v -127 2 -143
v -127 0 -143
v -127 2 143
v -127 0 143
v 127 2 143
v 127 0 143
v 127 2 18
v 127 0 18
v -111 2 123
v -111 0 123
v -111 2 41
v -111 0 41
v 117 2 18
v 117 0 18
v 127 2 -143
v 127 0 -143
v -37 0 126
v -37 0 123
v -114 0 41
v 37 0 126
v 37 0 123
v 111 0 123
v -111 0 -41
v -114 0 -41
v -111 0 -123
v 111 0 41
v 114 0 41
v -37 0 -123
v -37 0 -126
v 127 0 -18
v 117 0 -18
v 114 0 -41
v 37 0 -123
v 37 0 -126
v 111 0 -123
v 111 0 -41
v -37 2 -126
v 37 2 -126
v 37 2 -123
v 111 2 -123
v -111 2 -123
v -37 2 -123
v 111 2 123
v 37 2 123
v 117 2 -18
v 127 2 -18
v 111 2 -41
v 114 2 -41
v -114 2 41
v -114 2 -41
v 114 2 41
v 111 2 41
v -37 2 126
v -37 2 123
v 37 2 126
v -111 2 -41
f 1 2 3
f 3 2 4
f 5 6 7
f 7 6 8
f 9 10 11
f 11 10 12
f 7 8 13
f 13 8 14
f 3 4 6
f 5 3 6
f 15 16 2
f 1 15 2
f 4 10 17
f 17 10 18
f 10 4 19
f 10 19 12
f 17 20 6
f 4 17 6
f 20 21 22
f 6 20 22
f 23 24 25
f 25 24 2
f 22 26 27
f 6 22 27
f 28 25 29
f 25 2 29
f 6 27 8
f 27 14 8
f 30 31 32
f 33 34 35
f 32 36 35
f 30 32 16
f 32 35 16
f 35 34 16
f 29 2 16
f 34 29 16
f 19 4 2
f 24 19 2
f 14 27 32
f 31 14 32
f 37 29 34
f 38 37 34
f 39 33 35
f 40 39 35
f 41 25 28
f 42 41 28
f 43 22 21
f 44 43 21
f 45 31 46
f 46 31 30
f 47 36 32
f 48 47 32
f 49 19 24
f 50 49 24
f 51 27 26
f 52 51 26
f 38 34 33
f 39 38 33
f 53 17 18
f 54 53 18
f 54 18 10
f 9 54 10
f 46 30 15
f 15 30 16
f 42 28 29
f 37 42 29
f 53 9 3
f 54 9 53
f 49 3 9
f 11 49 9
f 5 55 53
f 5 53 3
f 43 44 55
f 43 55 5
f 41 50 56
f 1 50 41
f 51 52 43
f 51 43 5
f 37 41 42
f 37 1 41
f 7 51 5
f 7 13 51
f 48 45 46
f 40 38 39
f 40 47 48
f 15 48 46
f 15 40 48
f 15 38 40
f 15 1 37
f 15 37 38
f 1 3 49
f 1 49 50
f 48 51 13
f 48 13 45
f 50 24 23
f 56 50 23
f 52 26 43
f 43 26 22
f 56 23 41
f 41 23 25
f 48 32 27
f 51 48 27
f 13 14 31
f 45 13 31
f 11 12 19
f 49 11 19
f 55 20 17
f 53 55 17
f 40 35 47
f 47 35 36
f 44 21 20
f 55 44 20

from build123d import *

# Parameters (mm, degrees)
BOSS_EXTRUDE1_DEPTH = 2


with BuildPart() as part:
    # Sketch1 → Boss-Extrude1 (new body)
    with BuildSketch(Plane(origin=(0, 0, 0), x_dir=(1, 0, 0), z_dir=(0, 1, 0))):
        Polygon((-127, -143), (127, -143), (127, -18), (117, -18), (117, 18), (127, 18), (127, 143), (-127, 143), align=None)
        Polygon((37, 123), (111, 123), (111, 41), (114, 41), (114, -41), (111, -41), (111, -123), (37, -123), (37, -126), (-37, -126), (-37, -123), (-111, -123), (-111, -41), (-114, -41), (-114, 41), (-111, 41), (-111, 123), (-37, 123), (-37, 126), (37, 126), align=None, mode=Mode.SUBTRACT)
    extrude(amount=BOSS_EXTRUDE1_DEPTH)


solid = part.part
